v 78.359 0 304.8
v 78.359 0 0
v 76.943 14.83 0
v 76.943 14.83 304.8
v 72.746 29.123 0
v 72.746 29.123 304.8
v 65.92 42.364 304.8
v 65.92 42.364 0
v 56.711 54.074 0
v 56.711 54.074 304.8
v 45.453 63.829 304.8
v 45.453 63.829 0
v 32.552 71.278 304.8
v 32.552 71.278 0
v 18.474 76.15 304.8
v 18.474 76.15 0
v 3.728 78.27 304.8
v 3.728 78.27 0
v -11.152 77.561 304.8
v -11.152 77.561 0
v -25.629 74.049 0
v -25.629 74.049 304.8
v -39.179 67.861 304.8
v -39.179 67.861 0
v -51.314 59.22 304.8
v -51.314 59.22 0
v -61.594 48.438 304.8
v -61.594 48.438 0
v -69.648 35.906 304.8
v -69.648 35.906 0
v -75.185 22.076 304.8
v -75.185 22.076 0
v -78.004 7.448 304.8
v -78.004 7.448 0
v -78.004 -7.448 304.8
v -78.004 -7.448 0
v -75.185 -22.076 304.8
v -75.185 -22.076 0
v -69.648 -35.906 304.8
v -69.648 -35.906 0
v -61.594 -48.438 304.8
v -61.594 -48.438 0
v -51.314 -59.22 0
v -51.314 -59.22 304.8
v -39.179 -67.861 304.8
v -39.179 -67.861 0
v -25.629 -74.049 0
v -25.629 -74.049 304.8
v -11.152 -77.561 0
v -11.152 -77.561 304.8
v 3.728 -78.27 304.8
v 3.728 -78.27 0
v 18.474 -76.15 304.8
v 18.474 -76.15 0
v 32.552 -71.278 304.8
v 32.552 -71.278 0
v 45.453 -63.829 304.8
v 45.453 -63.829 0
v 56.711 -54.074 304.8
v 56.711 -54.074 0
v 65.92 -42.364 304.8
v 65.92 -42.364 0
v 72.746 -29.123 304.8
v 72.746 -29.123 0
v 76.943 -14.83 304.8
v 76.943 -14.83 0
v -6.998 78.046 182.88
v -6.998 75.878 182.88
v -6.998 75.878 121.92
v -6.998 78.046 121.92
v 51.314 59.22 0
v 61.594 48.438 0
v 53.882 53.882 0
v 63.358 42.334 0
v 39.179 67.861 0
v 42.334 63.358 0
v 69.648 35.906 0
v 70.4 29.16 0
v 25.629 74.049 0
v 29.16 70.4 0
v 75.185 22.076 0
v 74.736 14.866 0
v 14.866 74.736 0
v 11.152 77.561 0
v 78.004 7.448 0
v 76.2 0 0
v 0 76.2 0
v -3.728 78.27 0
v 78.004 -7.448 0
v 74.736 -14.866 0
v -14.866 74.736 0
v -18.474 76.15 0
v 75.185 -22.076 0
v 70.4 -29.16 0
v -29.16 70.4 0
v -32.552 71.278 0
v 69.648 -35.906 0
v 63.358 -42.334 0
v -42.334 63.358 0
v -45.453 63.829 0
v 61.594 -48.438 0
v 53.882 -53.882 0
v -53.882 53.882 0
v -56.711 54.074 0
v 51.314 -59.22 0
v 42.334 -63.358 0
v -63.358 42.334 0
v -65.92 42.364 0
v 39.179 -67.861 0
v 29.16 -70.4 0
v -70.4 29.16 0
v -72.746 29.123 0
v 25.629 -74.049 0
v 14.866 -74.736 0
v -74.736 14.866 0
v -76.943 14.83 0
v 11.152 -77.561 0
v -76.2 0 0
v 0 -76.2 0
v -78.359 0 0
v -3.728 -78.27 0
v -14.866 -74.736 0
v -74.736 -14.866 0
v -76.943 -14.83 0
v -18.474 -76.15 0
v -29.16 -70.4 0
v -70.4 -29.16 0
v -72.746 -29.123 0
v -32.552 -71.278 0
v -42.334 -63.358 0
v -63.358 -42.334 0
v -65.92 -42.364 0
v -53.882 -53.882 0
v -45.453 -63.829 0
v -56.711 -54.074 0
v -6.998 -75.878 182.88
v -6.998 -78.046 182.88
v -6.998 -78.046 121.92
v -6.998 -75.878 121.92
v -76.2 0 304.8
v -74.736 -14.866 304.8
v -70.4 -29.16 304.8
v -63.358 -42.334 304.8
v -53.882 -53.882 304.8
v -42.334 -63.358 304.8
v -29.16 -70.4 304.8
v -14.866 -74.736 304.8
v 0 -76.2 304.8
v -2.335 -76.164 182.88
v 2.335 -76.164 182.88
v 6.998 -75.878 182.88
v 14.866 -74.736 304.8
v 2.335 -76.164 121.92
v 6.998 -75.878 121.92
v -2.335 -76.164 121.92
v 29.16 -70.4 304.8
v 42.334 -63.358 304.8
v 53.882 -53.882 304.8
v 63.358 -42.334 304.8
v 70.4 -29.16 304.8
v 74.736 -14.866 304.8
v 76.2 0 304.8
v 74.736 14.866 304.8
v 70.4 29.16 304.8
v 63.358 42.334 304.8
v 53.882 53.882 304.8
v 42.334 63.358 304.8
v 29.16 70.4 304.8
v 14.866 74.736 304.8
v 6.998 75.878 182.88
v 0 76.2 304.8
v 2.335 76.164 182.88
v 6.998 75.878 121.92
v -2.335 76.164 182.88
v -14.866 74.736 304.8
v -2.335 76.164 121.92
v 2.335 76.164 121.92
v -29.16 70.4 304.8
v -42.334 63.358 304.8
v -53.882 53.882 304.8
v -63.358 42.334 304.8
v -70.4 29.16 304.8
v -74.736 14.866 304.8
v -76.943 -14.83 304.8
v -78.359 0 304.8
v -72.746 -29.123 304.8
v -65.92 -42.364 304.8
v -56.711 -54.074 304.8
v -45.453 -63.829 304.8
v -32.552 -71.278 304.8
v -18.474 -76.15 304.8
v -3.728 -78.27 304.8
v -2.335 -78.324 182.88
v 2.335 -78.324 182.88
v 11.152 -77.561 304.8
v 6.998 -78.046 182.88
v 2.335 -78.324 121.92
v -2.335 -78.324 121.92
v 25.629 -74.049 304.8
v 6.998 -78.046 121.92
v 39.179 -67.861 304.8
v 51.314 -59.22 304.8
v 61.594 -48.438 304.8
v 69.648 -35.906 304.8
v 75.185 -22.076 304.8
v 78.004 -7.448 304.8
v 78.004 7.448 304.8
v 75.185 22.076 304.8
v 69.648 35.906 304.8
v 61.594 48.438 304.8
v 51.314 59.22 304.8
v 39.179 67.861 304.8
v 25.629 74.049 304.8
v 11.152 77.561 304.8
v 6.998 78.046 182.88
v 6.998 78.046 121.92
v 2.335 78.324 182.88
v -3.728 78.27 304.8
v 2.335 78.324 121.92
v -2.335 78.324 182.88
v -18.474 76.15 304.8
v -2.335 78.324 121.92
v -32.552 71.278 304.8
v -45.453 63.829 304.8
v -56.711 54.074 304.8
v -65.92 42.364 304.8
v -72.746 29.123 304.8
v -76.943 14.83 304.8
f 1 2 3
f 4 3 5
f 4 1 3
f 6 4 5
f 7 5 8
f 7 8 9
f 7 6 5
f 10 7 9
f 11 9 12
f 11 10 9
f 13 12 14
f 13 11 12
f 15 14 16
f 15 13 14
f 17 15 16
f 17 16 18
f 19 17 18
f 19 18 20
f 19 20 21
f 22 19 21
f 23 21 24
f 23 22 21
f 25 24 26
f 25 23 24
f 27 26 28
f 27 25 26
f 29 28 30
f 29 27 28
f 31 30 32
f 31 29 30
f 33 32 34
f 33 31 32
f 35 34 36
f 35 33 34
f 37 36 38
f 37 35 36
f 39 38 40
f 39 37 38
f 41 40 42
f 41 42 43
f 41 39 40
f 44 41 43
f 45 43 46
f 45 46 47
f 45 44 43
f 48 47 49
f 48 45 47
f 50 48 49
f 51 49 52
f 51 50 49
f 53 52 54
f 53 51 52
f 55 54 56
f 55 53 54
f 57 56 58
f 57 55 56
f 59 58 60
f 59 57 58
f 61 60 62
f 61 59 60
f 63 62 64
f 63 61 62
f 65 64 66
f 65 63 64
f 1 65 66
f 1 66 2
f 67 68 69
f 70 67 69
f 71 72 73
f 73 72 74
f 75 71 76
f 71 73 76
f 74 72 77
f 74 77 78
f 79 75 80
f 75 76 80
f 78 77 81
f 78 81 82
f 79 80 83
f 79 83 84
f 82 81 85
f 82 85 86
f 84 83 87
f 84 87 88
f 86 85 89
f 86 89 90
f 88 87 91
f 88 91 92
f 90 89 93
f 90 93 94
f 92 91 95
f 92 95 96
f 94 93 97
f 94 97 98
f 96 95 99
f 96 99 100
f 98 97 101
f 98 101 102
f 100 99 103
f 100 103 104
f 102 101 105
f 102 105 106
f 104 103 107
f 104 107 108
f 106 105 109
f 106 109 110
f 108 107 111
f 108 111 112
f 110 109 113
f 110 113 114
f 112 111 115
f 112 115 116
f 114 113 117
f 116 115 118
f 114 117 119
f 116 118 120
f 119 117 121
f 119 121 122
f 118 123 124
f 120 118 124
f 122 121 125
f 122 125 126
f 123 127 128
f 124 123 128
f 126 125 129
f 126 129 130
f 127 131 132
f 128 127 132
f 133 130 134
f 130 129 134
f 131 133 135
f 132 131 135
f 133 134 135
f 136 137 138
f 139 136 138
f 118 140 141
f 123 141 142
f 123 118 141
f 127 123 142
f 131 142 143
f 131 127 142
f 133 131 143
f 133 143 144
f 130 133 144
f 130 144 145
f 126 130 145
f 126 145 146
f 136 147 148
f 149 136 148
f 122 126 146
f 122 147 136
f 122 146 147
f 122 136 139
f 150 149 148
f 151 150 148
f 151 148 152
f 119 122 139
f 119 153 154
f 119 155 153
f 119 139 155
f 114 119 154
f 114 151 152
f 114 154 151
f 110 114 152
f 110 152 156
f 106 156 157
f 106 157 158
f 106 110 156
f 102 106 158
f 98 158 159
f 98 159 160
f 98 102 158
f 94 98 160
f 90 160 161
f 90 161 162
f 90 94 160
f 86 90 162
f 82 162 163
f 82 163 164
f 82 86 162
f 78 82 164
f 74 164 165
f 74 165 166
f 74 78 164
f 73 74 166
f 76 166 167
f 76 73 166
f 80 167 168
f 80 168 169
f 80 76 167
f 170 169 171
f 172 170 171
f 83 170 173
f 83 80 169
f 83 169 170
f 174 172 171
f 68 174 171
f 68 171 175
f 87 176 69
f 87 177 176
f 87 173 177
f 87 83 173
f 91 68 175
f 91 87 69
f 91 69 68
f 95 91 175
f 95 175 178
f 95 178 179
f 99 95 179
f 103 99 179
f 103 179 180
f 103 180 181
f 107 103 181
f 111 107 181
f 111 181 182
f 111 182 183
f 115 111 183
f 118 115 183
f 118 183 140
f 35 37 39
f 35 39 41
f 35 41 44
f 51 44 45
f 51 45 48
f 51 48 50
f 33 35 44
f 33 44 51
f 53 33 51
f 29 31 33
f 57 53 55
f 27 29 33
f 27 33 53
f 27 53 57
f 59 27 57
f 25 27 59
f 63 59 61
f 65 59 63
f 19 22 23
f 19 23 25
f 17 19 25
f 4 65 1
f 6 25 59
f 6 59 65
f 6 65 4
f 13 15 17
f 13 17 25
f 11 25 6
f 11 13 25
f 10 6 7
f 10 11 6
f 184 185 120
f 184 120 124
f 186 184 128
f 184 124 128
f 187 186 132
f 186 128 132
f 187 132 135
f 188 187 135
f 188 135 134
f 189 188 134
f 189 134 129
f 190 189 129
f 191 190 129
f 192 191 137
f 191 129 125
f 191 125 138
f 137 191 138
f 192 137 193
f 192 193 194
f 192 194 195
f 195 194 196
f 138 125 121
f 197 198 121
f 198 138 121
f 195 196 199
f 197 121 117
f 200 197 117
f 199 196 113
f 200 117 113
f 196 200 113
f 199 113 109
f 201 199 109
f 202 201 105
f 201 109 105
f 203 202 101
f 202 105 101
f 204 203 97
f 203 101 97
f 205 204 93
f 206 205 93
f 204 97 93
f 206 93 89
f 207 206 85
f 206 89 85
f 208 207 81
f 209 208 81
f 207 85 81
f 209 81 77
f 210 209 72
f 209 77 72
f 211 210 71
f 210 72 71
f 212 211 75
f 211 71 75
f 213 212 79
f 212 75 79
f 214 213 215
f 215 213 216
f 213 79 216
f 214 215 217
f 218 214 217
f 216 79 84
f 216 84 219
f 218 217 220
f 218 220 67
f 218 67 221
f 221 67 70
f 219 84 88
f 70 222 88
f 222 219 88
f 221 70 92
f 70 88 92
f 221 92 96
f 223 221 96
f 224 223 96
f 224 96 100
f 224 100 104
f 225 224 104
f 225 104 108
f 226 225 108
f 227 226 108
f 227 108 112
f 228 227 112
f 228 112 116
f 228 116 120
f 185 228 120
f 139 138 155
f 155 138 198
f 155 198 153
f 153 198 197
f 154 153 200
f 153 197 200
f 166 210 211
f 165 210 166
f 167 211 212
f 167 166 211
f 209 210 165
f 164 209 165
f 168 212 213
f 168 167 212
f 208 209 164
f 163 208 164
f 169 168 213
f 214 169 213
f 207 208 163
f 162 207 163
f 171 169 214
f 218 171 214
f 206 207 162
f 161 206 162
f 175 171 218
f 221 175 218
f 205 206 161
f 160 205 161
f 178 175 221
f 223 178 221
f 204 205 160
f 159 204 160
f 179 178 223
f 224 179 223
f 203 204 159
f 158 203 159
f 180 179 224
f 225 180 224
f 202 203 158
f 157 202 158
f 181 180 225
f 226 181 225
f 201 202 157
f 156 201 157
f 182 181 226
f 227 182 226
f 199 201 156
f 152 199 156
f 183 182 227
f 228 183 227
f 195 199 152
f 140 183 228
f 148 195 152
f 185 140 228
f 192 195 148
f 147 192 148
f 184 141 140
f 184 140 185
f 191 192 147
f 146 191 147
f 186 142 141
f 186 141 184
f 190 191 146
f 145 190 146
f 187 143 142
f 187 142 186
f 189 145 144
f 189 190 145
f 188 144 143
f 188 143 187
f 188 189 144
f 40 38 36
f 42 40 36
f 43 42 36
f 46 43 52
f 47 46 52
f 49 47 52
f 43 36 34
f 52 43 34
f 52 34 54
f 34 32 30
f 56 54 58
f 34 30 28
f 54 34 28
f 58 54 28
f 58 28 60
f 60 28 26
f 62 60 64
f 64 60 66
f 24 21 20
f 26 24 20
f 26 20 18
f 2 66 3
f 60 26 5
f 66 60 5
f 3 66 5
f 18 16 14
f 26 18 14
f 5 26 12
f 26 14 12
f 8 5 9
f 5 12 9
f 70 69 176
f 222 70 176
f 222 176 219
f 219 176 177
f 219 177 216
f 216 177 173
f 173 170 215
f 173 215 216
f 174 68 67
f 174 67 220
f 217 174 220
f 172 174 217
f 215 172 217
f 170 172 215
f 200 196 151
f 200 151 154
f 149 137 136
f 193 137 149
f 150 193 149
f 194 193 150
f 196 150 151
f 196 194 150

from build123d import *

# Parameters (mm, degrees)
SKETCH2_R               = 78.359
SKETCH2_R_2             = 76.2
BOSS_EXTRUDE1_DEPTH     = 304.8
CUT_EXTRUDE1_DEPTH      = 325.319758513
CUT_EXTRUDE1_DEPTH_BACK = 325.319758513
SKETCH3_W               = 13.9954
SKETCH3_H               = 60.96
SKETCH4_R               = 78.359
BOSS_EXTRUDE2_DEPTH     = 304.8


with BuildPart() as part:
    # Sketch2 → Boss-Extrude1 (new body)
    with BuildSketch(Plane.XY):
        with Locations(Location((0, 0, 0), (0, 0, 180))):
            Circle(SKETCH2_R)
        with Locations(Location((0, 0, 0), (0, 0, 180))):
            Circle(SKETCH2_R_2, mode=Mode.SUBTRACT)
    extrude(amount=BOSS_EXTRUDE1_DEPTH)

    # Sketch3 → Cut-Extrude1 (cut, two sides: drawn at the far end of the back side and taken through both)
    with BuildSketch(Plane(origin=(0, 0, 0), x_dir=(1, 0, 0), z_dir=(0, 1, 0)).offset(-CUT_EXTRUDE1_DEPTH_BACK)):
        with Locations((0, -152.4)):
            Rectangle(SKETCH3_W, SKETCH3_H)
    extrude(amount=CUT_EXTRUDE1_DEPTH + CUT_EXTRUDE1_DEPTH_BACK, mode=Mode.SUBTRACT)


with BuildPart() as body_2:
    # Sketch4 → Boss-Extrude2 (new, through all)
    with BuildSketch(Plane.XY.offset(304.8)):
        Circle(SKETCH4_R)
    extrude(amount=-BOSS_EXTRUDE2_DEPTH)


solid = Compound([part.part, body_2.part])
